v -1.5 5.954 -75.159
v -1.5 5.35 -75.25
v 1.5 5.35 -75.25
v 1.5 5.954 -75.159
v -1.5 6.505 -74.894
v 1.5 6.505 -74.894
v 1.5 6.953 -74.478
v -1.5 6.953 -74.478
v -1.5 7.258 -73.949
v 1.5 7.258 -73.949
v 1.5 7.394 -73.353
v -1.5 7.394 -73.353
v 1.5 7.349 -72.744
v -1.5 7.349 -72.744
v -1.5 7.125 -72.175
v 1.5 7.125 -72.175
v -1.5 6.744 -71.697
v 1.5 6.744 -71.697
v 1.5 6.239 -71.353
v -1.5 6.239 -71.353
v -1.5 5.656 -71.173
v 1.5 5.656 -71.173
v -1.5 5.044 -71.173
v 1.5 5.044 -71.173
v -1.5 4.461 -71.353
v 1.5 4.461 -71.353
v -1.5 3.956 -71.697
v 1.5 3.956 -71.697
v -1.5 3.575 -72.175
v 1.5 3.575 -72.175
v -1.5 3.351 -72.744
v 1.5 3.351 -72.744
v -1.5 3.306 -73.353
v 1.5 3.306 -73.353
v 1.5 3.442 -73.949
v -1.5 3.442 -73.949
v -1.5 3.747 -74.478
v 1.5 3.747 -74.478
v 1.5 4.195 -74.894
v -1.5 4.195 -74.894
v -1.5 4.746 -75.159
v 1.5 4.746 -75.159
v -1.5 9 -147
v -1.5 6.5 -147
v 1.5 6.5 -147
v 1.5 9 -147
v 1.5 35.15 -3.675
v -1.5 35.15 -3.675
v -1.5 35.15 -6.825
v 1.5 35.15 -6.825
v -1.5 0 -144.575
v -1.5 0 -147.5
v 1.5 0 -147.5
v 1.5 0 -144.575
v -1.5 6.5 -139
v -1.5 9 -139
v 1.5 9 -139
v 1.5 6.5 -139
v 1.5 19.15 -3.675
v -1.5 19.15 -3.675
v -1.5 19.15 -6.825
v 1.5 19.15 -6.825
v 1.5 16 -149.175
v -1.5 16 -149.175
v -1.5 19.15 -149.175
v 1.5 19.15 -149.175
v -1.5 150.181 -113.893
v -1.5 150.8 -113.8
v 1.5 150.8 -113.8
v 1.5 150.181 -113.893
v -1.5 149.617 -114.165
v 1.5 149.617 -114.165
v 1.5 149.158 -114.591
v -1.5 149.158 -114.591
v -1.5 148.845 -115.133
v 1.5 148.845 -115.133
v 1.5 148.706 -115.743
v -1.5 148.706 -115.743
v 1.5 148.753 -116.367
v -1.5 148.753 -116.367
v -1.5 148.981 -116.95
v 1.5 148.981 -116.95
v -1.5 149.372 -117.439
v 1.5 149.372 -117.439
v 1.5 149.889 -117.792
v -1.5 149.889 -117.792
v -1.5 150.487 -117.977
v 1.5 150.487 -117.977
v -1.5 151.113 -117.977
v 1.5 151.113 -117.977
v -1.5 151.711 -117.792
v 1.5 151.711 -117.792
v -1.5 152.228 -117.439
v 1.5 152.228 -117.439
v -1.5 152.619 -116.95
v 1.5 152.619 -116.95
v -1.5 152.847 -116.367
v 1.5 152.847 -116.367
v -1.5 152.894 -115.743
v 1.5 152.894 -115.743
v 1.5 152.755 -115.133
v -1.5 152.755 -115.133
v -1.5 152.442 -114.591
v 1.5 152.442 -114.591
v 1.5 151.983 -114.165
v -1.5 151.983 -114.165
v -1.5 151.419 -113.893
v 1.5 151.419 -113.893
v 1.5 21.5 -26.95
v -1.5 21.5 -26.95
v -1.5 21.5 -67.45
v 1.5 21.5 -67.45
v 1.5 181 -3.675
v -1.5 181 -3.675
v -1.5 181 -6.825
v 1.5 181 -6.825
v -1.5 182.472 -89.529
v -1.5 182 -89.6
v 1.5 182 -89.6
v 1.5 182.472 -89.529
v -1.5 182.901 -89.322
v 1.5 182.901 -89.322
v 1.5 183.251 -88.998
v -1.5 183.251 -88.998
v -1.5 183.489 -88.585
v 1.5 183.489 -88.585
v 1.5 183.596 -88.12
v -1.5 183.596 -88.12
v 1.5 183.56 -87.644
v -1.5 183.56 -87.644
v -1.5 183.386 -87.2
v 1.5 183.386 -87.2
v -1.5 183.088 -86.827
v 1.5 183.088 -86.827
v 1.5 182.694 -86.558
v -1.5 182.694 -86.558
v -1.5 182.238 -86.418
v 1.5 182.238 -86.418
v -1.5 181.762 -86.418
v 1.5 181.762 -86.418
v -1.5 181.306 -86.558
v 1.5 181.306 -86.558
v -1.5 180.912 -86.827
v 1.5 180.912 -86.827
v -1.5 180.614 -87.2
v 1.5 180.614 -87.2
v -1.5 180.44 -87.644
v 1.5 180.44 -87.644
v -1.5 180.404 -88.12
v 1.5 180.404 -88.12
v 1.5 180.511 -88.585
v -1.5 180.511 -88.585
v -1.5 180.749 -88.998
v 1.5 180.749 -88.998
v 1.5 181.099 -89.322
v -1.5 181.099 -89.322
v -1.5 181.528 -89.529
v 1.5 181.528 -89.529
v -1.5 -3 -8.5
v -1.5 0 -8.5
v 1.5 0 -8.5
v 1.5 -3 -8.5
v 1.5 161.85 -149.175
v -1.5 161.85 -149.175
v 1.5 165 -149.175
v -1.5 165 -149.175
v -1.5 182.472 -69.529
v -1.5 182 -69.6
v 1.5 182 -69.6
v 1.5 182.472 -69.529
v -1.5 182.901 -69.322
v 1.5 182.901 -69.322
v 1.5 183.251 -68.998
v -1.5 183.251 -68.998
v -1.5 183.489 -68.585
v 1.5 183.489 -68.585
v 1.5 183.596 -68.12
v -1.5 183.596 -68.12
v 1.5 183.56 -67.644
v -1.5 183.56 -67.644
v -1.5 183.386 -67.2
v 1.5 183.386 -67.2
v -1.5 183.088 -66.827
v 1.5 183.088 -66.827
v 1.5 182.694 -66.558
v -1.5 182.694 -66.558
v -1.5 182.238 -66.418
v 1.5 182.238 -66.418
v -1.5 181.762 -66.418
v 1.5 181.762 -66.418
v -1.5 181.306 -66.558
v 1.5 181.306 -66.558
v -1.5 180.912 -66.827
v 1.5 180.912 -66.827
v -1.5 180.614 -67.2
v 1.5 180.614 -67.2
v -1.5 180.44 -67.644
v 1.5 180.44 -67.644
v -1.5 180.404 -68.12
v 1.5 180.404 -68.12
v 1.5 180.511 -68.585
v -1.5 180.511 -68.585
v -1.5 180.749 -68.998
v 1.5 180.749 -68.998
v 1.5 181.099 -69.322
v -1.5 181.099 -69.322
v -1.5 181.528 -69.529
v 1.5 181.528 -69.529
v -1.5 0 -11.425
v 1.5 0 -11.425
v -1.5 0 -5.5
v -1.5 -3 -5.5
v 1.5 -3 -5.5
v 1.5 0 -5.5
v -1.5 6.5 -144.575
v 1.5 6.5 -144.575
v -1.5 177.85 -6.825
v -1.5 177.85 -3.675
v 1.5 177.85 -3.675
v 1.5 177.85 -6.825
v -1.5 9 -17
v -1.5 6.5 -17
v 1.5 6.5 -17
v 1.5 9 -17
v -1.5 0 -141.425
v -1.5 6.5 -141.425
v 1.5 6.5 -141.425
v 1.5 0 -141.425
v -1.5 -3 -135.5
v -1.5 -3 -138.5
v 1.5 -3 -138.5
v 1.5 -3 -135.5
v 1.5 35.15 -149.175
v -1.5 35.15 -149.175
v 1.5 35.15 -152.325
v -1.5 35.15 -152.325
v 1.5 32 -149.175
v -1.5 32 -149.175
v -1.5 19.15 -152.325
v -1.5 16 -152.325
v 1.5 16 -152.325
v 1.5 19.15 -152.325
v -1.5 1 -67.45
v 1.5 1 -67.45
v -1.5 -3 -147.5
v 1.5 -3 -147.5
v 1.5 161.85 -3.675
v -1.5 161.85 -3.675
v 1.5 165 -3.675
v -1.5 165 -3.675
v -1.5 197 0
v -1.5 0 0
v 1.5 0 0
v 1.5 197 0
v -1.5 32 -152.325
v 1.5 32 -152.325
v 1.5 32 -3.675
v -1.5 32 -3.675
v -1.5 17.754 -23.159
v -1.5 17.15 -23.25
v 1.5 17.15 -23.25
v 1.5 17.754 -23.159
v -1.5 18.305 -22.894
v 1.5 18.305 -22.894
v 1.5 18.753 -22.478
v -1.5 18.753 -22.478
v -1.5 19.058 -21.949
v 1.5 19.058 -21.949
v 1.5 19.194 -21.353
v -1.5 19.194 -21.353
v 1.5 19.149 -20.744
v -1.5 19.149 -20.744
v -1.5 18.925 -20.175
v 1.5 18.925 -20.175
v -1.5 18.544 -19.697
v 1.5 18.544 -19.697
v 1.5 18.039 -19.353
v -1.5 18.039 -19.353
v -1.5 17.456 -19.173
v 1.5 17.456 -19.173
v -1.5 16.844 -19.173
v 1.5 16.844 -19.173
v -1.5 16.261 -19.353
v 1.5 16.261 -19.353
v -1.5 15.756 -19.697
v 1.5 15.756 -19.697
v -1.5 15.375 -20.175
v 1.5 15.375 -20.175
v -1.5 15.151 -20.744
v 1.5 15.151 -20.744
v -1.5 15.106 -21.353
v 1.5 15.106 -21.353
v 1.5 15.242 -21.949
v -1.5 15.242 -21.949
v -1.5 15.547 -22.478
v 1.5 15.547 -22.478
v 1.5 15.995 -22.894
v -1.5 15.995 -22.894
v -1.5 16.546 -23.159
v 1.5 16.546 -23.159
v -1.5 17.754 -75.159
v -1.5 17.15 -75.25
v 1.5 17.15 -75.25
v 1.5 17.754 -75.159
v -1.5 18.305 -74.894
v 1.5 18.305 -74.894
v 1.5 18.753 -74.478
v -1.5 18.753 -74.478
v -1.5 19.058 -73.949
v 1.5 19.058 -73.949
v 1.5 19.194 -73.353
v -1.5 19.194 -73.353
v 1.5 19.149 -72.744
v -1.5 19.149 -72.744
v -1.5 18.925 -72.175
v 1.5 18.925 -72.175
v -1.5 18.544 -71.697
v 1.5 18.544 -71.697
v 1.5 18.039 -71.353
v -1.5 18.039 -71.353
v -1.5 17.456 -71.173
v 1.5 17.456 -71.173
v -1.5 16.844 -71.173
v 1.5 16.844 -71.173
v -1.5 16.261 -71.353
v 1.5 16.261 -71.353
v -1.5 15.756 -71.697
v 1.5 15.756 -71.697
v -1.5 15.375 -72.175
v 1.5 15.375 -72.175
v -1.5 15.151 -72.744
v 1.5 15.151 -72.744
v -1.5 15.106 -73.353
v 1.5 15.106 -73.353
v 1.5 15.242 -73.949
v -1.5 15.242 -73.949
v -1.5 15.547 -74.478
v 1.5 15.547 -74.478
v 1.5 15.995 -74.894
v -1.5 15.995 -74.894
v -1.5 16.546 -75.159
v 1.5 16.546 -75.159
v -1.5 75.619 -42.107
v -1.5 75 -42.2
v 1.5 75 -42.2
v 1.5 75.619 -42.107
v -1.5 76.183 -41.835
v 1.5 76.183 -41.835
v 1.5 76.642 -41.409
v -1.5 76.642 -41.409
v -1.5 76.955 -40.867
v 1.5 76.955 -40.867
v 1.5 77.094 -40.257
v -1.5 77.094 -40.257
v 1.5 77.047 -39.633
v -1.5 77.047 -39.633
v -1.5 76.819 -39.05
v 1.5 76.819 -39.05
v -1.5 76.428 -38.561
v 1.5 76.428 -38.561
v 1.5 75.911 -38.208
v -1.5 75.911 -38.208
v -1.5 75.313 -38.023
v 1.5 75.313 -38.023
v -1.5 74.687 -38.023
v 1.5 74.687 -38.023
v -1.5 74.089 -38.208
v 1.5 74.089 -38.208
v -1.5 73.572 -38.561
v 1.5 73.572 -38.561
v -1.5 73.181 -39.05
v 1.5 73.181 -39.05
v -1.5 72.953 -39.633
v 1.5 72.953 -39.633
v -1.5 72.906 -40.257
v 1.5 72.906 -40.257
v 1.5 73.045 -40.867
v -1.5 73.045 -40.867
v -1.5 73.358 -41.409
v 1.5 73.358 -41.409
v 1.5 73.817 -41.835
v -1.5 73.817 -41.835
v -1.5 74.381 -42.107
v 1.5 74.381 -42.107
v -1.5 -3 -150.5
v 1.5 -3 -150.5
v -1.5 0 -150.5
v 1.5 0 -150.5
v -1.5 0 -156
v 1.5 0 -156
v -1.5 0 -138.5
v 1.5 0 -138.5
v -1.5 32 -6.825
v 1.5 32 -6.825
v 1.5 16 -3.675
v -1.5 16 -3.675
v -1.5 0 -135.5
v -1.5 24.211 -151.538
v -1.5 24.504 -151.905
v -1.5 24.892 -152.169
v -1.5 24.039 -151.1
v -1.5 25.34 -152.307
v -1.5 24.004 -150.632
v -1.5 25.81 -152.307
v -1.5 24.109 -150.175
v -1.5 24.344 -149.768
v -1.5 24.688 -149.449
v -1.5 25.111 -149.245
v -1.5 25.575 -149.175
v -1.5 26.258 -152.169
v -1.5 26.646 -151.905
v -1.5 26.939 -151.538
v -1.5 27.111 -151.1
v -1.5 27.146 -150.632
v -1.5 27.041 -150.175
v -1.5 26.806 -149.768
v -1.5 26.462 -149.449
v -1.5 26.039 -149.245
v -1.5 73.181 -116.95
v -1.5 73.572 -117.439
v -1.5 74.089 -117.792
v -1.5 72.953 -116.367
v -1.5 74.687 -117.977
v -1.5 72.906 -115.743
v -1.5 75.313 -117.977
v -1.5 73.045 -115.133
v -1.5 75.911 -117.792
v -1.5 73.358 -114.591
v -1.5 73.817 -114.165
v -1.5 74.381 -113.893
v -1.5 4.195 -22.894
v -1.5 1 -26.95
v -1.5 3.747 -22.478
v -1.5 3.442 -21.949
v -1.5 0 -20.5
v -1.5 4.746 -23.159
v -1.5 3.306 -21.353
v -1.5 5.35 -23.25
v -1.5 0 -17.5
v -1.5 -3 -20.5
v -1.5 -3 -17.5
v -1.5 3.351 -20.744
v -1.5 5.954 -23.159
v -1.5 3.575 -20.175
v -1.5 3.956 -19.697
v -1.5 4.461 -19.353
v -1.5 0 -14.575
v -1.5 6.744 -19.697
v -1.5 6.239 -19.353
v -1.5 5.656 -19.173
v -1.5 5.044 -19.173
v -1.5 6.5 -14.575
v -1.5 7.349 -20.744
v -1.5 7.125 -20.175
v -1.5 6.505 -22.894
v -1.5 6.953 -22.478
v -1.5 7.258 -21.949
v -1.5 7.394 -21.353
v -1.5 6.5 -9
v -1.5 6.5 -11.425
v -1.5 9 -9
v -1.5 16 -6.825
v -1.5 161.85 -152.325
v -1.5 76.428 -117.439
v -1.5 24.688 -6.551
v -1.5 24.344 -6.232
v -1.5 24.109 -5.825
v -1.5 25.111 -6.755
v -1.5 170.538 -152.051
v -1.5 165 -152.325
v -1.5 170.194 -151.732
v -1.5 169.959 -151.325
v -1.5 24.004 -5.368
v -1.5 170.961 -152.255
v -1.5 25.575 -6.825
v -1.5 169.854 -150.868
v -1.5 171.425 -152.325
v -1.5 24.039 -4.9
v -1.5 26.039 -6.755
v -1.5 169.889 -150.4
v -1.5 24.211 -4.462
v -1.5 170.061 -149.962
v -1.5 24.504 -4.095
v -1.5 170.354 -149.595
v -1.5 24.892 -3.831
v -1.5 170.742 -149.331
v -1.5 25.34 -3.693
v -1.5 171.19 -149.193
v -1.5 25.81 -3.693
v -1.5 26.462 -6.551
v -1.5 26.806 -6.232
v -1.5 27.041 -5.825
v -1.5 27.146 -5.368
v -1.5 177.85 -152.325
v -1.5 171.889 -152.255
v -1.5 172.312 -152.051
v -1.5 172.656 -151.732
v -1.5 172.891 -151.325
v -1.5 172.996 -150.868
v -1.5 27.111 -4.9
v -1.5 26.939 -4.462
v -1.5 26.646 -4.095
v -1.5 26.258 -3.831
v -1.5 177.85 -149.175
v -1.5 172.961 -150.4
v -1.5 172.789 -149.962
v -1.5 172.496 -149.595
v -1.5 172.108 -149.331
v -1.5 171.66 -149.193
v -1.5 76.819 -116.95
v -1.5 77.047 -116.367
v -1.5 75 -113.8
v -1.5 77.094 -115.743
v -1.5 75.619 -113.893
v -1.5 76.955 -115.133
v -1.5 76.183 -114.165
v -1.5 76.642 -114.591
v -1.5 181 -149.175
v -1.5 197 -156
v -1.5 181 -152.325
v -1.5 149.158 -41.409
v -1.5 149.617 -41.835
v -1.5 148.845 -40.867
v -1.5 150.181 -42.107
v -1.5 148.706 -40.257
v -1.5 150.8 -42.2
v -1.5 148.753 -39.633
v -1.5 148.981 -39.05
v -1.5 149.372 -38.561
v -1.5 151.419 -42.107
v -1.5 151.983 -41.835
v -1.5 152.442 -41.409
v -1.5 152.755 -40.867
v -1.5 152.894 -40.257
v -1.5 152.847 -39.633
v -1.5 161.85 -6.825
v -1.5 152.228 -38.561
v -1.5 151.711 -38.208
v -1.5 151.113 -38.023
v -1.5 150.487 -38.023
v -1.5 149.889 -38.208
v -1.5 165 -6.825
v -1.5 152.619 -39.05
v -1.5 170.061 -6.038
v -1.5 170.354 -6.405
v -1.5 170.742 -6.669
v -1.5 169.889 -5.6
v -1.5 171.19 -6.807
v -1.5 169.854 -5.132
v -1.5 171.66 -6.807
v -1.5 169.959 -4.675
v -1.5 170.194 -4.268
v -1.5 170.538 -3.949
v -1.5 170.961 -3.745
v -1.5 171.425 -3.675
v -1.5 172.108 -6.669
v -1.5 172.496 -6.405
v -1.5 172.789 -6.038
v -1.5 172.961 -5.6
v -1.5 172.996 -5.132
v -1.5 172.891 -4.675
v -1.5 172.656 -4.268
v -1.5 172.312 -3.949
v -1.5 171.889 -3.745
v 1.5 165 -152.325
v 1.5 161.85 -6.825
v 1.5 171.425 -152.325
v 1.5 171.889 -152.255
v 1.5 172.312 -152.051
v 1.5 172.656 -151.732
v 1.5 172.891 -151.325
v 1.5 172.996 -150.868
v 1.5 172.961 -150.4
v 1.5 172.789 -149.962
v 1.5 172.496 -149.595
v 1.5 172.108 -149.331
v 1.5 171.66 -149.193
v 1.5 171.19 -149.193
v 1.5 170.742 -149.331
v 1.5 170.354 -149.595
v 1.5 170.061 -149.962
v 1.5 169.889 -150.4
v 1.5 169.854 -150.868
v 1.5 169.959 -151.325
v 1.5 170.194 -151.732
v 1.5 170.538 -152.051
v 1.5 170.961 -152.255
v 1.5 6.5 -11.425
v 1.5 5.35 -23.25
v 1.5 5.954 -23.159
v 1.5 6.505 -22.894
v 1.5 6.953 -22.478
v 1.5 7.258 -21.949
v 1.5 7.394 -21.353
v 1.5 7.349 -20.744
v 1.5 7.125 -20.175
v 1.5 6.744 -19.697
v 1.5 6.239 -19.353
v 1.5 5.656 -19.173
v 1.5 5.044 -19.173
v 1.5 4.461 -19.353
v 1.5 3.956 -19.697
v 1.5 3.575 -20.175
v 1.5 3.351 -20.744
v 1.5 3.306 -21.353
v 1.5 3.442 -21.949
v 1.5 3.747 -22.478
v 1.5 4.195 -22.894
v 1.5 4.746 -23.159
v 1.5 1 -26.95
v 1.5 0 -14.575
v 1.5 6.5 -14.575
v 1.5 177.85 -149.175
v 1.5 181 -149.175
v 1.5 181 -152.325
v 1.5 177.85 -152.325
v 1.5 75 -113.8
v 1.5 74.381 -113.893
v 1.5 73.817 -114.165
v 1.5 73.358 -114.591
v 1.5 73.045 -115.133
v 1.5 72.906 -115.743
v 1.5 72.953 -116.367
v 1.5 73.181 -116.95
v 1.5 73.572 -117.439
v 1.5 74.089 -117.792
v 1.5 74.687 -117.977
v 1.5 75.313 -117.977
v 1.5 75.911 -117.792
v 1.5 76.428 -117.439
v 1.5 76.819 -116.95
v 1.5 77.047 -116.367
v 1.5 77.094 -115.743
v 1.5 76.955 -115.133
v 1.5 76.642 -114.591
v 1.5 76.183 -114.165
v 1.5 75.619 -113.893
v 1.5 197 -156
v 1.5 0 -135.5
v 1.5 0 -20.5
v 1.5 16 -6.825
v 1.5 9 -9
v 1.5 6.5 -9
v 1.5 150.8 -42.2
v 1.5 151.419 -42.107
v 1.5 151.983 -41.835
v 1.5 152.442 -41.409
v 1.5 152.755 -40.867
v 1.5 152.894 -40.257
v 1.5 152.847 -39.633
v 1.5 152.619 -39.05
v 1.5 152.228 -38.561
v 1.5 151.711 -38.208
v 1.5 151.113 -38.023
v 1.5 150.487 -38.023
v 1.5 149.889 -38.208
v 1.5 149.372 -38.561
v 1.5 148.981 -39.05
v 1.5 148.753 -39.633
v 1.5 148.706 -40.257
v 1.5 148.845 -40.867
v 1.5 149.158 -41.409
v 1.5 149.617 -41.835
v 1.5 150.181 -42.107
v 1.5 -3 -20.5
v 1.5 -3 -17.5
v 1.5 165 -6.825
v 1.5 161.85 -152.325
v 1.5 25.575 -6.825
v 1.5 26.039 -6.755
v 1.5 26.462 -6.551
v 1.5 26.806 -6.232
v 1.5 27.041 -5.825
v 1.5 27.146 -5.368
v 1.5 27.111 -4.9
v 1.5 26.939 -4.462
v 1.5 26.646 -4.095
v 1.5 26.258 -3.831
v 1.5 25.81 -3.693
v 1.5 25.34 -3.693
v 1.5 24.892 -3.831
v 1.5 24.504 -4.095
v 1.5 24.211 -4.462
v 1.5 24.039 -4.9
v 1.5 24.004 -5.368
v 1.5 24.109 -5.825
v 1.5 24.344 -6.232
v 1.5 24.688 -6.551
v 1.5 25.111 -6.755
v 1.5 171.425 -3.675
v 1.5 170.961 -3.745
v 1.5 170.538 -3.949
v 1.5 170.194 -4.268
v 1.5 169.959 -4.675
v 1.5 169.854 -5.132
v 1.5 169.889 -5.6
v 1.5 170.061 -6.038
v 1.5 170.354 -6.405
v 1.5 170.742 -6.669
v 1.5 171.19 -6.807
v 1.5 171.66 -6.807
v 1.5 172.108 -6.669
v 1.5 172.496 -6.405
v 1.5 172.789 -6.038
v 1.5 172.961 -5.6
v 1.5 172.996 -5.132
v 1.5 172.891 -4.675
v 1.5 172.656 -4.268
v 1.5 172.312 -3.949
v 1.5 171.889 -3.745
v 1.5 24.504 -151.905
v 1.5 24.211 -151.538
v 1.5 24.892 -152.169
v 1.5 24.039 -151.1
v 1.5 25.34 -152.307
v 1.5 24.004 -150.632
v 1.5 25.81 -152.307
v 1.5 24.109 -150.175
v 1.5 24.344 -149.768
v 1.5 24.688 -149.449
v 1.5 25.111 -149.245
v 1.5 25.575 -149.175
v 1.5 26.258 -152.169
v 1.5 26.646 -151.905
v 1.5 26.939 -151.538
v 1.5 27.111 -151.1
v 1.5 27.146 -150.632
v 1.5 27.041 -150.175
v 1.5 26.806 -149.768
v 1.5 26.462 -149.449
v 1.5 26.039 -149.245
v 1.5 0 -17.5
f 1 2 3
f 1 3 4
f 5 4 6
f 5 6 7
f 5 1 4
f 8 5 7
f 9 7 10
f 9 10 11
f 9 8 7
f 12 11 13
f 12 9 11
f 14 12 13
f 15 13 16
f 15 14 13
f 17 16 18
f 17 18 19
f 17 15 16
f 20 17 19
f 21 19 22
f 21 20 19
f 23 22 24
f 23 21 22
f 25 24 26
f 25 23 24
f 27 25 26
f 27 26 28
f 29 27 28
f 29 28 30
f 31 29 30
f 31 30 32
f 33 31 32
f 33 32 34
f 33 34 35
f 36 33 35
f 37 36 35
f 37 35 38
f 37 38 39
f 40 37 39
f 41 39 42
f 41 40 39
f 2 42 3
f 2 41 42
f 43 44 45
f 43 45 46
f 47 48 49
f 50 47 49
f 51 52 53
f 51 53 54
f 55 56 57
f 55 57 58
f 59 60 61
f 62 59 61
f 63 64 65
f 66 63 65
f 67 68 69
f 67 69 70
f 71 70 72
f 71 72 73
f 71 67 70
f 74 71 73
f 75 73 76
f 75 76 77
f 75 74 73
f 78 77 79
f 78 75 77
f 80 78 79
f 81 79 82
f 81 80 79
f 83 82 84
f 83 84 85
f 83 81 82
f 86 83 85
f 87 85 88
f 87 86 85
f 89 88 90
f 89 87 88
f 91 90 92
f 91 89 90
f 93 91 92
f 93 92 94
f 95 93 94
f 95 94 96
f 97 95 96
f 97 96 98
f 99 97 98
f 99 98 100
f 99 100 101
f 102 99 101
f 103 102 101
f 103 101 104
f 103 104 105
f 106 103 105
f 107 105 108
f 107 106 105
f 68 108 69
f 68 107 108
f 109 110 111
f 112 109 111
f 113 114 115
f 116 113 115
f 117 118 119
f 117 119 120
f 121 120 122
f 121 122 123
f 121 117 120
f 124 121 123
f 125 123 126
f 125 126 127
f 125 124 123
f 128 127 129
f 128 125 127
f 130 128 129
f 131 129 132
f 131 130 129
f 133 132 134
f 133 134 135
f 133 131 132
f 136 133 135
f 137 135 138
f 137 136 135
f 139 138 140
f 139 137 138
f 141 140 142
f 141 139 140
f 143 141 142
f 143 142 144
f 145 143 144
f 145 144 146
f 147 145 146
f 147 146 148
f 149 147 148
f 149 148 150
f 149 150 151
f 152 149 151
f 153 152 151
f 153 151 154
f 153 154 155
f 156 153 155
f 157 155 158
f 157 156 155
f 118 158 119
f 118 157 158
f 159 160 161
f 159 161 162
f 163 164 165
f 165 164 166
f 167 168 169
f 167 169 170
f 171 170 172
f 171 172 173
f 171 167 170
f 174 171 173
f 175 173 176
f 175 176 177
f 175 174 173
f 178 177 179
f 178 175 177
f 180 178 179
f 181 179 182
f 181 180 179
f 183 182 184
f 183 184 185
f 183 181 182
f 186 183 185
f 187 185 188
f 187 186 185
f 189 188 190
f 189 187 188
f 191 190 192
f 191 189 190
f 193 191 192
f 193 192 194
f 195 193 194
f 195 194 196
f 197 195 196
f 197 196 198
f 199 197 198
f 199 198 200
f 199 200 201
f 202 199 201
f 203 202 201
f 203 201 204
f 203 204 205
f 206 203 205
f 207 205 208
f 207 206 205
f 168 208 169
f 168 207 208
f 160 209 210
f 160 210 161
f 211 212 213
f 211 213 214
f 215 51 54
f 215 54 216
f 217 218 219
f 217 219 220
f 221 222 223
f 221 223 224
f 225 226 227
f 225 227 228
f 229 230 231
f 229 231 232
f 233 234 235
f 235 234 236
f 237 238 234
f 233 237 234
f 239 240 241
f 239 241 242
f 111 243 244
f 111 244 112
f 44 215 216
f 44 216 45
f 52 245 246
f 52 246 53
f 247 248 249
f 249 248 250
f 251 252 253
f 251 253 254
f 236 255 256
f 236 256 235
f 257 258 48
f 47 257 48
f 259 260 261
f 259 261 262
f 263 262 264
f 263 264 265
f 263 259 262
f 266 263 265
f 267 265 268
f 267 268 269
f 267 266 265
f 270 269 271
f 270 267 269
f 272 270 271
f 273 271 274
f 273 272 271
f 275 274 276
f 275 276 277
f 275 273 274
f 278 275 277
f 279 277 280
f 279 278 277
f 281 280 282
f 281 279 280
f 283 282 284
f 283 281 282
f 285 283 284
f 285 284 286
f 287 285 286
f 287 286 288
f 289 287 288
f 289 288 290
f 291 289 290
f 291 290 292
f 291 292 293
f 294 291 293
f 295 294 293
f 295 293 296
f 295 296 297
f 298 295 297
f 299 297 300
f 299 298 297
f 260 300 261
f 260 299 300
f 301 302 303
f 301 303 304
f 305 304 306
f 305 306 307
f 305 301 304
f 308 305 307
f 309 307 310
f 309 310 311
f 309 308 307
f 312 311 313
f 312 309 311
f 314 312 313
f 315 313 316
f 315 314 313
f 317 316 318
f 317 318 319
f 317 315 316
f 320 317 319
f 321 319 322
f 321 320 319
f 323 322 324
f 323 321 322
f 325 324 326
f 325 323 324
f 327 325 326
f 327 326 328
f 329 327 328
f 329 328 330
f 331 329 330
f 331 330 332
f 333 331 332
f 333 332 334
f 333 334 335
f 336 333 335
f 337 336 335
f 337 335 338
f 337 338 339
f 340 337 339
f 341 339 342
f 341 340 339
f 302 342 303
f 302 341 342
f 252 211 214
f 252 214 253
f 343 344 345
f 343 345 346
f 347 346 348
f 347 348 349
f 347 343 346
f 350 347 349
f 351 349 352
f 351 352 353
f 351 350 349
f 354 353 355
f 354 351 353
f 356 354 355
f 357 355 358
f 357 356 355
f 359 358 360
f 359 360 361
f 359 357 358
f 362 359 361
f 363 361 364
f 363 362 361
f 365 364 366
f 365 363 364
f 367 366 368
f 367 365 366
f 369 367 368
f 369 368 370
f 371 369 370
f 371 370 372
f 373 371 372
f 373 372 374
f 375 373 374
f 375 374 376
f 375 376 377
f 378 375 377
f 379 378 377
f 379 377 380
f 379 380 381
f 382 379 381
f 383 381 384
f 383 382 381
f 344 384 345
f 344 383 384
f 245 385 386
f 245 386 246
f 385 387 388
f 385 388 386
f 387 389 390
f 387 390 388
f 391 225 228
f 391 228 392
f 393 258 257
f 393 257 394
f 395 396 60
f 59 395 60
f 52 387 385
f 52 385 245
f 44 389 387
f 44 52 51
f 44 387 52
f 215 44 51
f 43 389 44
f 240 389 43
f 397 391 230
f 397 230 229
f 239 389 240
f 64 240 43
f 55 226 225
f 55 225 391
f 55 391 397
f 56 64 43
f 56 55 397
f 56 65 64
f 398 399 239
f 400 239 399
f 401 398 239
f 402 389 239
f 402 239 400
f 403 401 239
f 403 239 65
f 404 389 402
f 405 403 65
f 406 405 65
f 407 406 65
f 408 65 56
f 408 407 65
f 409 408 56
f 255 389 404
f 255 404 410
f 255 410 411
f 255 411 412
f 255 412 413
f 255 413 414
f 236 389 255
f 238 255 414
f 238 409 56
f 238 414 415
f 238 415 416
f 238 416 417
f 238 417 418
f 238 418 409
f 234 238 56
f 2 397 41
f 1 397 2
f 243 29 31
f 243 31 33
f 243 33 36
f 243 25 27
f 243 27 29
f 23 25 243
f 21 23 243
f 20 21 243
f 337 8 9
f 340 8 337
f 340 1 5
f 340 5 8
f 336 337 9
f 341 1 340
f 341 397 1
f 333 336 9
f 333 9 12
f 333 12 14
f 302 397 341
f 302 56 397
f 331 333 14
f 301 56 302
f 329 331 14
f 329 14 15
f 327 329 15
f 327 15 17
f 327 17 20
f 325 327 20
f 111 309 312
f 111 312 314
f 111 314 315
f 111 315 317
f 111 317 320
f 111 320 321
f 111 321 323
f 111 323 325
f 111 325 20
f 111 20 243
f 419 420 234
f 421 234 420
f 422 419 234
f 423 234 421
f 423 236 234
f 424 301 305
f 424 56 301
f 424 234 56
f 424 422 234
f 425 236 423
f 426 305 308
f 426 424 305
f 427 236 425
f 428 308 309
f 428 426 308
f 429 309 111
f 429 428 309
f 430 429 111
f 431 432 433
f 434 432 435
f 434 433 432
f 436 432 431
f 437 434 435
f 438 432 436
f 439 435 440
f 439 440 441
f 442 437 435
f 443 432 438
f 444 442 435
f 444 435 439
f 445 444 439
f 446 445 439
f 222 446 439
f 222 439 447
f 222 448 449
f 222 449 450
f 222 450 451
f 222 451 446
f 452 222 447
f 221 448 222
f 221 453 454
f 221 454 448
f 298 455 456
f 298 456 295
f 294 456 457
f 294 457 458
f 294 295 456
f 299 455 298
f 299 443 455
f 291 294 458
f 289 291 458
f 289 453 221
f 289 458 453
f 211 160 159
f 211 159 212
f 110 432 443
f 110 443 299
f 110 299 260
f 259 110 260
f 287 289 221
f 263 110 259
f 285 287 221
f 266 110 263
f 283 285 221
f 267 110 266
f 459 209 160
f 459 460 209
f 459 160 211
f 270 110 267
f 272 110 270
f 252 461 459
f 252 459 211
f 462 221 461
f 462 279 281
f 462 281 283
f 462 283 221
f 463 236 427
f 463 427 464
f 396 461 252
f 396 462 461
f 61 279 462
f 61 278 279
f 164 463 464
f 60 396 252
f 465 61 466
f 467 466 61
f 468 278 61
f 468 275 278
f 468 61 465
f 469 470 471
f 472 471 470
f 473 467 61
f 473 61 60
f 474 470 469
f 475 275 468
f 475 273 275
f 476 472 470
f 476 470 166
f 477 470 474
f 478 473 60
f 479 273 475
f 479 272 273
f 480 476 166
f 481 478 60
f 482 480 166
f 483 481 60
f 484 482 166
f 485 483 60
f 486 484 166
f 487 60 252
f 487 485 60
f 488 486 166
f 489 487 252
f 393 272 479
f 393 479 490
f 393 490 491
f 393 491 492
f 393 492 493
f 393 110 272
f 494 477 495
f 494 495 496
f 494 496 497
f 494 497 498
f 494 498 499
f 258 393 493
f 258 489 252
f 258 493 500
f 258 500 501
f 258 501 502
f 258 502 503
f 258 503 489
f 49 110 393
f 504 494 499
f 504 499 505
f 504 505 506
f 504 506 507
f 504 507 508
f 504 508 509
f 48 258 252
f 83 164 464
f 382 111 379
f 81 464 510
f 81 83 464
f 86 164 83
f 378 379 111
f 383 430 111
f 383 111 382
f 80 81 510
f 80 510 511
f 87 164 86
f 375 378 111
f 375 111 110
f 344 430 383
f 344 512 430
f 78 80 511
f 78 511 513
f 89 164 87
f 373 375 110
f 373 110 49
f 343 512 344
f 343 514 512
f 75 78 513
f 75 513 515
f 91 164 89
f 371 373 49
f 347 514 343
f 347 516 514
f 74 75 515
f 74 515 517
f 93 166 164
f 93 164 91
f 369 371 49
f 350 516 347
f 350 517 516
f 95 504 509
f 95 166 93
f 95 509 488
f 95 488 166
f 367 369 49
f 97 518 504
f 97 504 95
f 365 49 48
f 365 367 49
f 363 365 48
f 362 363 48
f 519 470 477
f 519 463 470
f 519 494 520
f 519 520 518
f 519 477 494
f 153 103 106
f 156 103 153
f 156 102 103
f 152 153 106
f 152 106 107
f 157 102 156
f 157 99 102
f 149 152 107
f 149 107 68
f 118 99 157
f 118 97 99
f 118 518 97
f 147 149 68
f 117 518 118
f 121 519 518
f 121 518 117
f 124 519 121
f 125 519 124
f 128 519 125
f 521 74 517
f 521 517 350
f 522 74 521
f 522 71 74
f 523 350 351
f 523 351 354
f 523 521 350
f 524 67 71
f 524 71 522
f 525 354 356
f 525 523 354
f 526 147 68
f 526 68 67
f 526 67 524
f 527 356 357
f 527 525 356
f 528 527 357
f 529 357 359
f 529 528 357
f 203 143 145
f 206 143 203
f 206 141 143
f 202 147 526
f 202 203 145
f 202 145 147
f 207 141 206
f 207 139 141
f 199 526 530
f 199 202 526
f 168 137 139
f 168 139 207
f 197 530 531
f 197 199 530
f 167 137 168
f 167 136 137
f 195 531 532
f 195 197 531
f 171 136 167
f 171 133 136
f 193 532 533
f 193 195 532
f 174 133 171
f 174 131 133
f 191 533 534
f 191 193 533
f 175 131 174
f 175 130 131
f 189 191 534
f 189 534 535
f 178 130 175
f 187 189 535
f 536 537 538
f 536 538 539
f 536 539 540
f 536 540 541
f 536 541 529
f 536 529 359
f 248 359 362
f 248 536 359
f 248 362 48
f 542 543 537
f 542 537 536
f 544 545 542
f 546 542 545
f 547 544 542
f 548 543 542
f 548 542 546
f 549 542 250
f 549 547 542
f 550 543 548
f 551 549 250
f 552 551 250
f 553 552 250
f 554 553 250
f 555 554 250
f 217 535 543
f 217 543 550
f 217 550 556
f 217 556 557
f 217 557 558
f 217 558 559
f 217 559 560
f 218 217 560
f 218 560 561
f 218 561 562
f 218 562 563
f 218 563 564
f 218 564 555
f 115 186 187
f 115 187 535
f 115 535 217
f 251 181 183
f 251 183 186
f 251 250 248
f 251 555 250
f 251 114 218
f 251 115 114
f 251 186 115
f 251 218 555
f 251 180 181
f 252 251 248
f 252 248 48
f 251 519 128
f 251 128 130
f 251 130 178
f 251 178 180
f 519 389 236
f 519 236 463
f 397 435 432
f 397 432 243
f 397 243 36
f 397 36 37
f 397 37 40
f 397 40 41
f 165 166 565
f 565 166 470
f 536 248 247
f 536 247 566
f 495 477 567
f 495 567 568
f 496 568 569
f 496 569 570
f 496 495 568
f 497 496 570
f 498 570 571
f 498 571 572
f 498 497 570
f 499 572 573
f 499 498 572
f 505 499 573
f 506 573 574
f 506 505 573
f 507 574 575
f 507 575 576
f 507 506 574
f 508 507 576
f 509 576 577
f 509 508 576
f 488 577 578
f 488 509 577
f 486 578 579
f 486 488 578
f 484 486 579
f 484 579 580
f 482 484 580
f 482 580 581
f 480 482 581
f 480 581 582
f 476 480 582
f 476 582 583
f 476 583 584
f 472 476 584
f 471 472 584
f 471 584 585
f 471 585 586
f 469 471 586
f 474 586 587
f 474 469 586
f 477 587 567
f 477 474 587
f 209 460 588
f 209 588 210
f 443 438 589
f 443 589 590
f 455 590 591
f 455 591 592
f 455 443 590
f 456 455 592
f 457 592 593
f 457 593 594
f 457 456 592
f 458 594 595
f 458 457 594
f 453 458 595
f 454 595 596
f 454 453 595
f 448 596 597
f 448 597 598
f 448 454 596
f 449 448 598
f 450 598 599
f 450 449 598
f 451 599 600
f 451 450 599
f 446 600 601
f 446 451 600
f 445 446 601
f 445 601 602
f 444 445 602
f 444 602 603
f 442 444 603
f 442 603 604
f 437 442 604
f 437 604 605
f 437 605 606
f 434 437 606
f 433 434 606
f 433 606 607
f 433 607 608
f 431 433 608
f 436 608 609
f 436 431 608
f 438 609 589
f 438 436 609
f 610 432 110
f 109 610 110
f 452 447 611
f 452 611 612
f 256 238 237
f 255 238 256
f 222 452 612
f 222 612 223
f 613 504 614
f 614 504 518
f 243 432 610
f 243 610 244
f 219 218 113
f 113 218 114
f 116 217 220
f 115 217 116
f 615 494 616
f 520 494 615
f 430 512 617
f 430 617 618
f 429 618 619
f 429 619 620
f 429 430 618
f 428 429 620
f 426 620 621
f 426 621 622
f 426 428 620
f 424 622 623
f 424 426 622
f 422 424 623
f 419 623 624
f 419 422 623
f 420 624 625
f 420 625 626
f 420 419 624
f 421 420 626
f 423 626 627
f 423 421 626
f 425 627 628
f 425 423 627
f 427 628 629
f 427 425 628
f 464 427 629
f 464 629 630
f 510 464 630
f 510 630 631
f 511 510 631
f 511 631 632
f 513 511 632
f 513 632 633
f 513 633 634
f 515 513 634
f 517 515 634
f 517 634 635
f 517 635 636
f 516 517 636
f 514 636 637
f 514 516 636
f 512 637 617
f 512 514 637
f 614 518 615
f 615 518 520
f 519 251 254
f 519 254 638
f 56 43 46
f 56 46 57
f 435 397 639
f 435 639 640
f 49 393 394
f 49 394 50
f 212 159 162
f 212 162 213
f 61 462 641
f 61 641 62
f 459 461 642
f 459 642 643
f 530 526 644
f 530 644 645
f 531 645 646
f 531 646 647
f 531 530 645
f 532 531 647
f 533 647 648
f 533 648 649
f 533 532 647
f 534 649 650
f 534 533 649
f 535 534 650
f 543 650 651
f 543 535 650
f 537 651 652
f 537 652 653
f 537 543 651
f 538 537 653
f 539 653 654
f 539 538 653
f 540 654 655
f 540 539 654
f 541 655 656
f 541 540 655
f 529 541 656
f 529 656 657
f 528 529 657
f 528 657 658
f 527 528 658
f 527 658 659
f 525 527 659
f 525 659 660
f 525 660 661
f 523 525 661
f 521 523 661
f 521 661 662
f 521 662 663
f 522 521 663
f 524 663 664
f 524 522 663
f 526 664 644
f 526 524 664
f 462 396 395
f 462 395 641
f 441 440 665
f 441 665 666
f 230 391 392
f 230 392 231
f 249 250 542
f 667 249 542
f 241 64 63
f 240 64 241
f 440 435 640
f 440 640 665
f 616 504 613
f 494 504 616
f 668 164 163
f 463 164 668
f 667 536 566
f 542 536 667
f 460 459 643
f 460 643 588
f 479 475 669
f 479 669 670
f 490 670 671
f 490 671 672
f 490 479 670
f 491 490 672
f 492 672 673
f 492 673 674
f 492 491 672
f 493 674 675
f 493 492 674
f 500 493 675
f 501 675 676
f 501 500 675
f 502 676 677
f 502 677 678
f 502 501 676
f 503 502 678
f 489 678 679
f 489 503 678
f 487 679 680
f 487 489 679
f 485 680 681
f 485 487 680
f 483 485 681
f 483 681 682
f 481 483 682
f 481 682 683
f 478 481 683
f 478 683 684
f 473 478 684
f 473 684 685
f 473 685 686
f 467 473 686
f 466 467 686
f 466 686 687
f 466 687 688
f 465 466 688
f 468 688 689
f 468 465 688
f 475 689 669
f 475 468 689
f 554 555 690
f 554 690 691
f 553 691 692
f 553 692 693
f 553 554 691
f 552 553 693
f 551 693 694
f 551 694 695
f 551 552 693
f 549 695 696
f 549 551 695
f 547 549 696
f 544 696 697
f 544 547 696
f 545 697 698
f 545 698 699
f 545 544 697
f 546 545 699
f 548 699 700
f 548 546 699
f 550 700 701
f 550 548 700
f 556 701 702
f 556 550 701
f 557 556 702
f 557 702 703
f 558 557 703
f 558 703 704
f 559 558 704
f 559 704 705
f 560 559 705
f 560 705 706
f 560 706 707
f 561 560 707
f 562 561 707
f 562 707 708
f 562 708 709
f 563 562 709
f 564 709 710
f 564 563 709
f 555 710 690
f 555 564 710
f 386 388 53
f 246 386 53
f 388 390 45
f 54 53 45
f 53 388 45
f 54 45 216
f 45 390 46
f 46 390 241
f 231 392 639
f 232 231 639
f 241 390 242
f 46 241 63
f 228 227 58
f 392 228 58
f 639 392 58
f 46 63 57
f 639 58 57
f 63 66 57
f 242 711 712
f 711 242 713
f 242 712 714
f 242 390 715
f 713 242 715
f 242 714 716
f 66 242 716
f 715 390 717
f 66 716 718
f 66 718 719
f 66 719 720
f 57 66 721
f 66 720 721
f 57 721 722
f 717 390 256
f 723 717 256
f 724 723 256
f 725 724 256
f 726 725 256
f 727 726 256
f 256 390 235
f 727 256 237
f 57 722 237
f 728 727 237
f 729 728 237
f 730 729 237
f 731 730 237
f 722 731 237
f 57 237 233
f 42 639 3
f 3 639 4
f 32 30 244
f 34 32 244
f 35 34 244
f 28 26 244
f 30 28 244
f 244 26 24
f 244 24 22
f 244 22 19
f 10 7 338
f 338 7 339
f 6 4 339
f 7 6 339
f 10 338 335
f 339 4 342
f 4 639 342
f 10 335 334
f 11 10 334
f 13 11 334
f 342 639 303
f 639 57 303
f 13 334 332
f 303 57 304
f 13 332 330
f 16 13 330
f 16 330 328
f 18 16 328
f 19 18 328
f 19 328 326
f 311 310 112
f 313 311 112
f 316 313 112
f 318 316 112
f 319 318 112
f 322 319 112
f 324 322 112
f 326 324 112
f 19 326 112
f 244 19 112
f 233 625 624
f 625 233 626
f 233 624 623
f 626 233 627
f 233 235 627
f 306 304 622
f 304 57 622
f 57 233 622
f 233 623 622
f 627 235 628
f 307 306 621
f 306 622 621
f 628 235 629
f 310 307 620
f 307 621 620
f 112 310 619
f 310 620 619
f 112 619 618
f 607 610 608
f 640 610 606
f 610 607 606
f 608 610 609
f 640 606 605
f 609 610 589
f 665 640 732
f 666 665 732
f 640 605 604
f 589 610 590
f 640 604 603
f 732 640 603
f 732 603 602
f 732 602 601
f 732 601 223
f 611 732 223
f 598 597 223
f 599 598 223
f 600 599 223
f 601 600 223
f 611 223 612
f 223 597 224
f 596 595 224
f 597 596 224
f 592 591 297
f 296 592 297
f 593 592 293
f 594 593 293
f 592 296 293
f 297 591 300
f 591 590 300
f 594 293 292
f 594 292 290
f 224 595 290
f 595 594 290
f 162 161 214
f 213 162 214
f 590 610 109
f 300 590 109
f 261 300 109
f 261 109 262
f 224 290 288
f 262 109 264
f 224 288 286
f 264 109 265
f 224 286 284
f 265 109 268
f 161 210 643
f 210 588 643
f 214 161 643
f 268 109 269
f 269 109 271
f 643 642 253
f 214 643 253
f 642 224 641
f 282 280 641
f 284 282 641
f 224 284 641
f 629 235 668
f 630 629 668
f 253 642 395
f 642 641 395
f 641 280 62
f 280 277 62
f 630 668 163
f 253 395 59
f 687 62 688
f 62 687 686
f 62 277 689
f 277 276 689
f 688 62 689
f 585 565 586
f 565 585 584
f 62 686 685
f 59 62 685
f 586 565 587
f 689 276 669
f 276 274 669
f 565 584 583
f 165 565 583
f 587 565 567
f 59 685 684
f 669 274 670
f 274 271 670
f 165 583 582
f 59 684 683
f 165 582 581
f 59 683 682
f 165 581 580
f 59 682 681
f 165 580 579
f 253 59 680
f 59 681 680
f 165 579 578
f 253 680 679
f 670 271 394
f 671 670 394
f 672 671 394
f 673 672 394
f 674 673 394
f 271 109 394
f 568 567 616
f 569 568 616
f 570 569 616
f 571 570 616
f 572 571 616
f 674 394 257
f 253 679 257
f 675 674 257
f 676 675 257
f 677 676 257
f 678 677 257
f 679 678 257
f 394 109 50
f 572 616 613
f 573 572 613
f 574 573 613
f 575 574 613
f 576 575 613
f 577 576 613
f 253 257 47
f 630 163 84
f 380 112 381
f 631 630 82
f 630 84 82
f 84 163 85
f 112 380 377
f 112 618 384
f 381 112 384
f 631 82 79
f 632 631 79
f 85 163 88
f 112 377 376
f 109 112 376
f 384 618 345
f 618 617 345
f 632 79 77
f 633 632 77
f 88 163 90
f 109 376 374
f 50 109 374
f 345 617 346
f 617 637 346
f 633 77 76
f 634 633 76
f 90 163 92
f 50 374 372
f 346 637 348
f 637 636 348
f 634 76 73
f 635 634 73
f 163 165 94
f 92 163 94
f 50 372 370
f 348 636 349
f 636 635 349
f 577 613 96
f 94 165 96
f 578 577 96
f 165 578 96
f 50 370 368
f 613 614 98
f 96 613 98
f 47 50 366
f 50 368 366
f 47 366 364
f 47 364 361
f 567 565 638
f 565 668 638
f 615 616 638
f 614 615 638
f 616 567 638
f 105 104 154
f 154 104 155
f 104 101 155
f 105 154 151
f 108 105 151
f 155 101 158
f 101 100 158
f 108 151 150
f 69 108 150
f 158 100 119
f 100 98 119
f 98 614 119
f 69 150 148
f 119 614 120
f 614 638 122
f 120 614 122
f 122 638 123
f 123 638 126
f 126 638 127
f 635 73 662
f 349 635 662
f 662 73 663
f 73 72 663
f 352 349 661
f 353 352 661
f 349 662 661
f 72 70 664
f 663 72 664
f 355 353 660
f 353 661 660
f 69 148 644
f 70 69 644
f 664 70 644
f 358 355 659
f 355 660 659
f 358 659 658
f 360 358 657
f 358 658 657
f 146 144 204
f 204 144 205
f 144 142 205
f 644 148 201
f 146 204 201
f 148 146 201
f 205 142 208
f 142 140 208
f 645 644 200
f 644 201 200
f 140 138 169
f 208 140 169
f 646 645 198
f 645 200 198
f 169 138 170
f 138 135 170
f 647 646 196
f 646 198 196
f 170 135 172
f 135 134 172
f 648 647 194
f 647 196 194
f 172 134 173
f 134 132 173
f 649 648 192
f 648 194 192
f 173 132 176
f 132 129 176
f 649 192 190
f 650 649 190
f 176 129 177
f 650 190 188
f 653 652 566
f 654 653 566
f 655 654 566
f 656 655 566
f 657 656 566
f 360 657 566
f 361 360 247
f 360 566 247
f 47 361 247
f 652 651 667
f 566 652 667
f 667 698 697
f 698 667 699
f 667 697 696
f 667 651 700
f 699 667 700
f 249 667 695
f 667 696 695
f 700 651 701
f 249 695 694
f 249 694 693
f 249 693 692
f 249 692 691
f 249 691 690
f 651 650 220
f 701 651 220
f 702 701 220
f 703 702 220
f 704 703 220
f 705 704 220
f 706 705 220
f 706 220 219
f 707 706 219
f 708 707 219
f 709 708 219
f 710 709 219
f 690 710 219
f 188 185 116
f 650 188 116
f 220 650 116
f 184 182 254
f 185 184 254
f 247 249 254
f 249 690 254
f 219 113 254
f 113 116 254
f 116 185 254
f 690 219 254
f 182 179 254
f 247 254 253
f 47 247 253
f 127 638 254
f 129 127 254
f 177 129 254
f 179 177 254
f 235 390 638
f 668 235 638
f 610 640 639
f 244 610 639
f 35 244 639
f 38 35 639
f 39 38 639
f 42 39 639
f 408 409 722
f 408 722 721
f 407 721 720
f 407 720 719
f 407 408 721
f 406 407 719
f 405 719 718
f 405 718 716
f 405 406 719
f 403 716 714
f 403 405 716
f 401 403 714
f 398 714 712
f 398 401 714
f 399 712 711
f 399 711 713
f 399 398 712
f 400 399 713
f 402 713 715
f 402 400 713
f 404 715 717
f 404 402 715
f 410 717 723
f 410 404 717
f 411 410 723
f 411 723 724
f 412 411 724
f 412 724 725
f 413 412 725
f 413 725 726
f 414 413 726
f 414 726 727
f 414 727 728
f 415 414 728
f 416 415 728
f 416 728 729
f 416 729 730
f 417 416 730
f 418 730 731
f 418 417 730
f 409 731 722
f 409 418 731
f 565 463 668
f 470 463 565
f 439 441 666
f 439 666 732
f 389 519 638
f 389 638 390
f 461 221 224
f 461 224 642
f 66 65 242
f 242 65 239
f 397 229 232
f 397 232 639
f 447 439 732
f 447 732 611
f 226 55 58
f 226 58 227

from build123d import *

# Parameters (mm, degrees)
BOSS_EXTRUDE2_DEPTH      = 1.5
BOSS_EXTRUDE2_DEPTH_BACK = 1.5
SKETCH1_R                = 1.575
SKETCH1_R_2              = 2.05
SKETCH1_R_3              = 2.1
SKETCH1_R_4              = 1.6
SKETCH1_W                = 40.5
SKETCH1_H                = 20.499999995
SKETCH1_W_2              = 3.15
SKETCH1_H_2              = 3.15


with BuildPart() as part:
    # Sketch1 → Boss-Extrude2 (new, two sides: drawn at the far end of the back side and taken through both)
    with BuildSketch(Plane(origin=(0, 0, 0), x_dir=(0, 0, -1), z_dir=(1, 0, 0)).offset(-BOSS_EXTRUDE2_DEPTH_BACK)):
        Polygon((11.425, 0), (8.5, 0), (8.5, -3), (5.5, -3), (5.5, 0), (0, 0), (0, 197), (156, 197), (156, 0), (150.5, 0), (150.5, -3), (147.5, -3), (147.5, 0), (144.575, 0), (144.575, 6.5), (147, 6.5), (147, 9), (139, 9), (139, 6.5), (141.425, 6.5), (141.425, 0), (138.5, 0), (138.5, -3), (135.5, -3), (135.5, 0), (20.5, 0), (20.5, -3), (17.5, -3), (17.5, 0), (14.575, 0), (14.575, 6.5), (17, 6.5), (17, 9), (9, 9), (9, 6.5), (11.425, 6.5), align=None)
        with Locations((5.25, 25.575)):
            Circle(SKETCH1_R, mode=Mode.SUBTRACT)
        with Locations((5.25, 171.425)):
            Circle(SKETCH1_R, mode=Mode.SUBTRACT)
        with Locations((150.75, 171.425)):
            Circle(SKETCH1_R, mode=Mode.SUBTRACT)
        with Locations((150.75, 25.575)):
            Circle(SKETCH1_R, mode=Mode.SUBTRACT)
        with Locations((73.2, 5.35)):
            Circle(SKETCH1_R_2, mode=Mode.SUBTRACT)
        with Locations((73.2, 17.149999995)):
            Circle(SKETCH1_R_2, mode=Mode.SUBTRACT)
        with Locations((21.2, 5.35)):
            Circle(SKETCH1_R_2, mode=Mode.SUBTRACT)
        with Locations((21.2, 17.149999995)):
            Circle(SKETCH1_R_2, mode=Mode.SUBTRACT)
        with Locations((40.1, 75)):
            Circle(SKETCH1_R_3, mode=Mode.SUBTRACT)
        with Locations((40.1, 150.8)):
            Circle(SKETCH1_R_3, mode=Mode.SUBTRACT)
        with Locations((115.9, 75)):
            Circle(SKETCH1_R_3, mode=Mode.SUBTRACT)
        with Locations((115.9, 150.8)):
            Circle(SKETCH1_R_3, mode=Mode.SUBTRACT)
        with Locations((88, 182)):
            Circle(SKETCH1_R_4, mode=Mode.SUBTRACT)
        with Locations((68, 182)):
            Circle(SKETCH1_R_4, mode=Mode.SUBTRACT)
        with Locations((47.2, 11.249999997)):
            Rectangle(SKETCH1_W, SKETCH1_H, mode=Mode.SUBTRACT)
        with Locations((5.25, 17.575)):
            Rectangle(SKETCH1_W_2, SKETCH1_H_2, mode=Mode.SUBTRACT)
        with Locations((5.25, 33.575)):
            Rectangle(SKETCH1_W_2, SKETCH1_H_2, mode=Mode.SUBTRACT)
        with Locations((5.25, 163.425)):
            Rectangle(SKETCH1_W_2, SKETCH1_H_2, mode=Mode.SUBTRACT)
        with Locations((5.25, 179.425)):
            Rectangle(SKETCH1_W_2, SKETCH1_H_2, mode=Mode.SUBTRACT)
        with Locations((150.75, 179.425)):
            Rectangle(SKETCH1_W_2, SKETCH1_H_2, mode=Mode.SUBTRACT)
        with Locations((150.75, 163.425)):
            Rectangle(SKETCH1_W_2, SKETCH1_H_2, mode=Mode.SUBTRACT)
        with Locations((150.75, 33.575)):
            Rectangle(SKETCH1_W_2, SKETCH1_H_2, mode=Mode.SUBTRACT)
        with Locations((150.75, 17.575)):
            Rectangle(SKETCH1_W_2, SKETCH1_H_2, mode=Mode.SUBTRACT)
    extrude(amount=BOSS_EXTRUDE2_DEPTH + BOSS_EXTRUDE2_DEPTH_BACK)


solid = part.part
